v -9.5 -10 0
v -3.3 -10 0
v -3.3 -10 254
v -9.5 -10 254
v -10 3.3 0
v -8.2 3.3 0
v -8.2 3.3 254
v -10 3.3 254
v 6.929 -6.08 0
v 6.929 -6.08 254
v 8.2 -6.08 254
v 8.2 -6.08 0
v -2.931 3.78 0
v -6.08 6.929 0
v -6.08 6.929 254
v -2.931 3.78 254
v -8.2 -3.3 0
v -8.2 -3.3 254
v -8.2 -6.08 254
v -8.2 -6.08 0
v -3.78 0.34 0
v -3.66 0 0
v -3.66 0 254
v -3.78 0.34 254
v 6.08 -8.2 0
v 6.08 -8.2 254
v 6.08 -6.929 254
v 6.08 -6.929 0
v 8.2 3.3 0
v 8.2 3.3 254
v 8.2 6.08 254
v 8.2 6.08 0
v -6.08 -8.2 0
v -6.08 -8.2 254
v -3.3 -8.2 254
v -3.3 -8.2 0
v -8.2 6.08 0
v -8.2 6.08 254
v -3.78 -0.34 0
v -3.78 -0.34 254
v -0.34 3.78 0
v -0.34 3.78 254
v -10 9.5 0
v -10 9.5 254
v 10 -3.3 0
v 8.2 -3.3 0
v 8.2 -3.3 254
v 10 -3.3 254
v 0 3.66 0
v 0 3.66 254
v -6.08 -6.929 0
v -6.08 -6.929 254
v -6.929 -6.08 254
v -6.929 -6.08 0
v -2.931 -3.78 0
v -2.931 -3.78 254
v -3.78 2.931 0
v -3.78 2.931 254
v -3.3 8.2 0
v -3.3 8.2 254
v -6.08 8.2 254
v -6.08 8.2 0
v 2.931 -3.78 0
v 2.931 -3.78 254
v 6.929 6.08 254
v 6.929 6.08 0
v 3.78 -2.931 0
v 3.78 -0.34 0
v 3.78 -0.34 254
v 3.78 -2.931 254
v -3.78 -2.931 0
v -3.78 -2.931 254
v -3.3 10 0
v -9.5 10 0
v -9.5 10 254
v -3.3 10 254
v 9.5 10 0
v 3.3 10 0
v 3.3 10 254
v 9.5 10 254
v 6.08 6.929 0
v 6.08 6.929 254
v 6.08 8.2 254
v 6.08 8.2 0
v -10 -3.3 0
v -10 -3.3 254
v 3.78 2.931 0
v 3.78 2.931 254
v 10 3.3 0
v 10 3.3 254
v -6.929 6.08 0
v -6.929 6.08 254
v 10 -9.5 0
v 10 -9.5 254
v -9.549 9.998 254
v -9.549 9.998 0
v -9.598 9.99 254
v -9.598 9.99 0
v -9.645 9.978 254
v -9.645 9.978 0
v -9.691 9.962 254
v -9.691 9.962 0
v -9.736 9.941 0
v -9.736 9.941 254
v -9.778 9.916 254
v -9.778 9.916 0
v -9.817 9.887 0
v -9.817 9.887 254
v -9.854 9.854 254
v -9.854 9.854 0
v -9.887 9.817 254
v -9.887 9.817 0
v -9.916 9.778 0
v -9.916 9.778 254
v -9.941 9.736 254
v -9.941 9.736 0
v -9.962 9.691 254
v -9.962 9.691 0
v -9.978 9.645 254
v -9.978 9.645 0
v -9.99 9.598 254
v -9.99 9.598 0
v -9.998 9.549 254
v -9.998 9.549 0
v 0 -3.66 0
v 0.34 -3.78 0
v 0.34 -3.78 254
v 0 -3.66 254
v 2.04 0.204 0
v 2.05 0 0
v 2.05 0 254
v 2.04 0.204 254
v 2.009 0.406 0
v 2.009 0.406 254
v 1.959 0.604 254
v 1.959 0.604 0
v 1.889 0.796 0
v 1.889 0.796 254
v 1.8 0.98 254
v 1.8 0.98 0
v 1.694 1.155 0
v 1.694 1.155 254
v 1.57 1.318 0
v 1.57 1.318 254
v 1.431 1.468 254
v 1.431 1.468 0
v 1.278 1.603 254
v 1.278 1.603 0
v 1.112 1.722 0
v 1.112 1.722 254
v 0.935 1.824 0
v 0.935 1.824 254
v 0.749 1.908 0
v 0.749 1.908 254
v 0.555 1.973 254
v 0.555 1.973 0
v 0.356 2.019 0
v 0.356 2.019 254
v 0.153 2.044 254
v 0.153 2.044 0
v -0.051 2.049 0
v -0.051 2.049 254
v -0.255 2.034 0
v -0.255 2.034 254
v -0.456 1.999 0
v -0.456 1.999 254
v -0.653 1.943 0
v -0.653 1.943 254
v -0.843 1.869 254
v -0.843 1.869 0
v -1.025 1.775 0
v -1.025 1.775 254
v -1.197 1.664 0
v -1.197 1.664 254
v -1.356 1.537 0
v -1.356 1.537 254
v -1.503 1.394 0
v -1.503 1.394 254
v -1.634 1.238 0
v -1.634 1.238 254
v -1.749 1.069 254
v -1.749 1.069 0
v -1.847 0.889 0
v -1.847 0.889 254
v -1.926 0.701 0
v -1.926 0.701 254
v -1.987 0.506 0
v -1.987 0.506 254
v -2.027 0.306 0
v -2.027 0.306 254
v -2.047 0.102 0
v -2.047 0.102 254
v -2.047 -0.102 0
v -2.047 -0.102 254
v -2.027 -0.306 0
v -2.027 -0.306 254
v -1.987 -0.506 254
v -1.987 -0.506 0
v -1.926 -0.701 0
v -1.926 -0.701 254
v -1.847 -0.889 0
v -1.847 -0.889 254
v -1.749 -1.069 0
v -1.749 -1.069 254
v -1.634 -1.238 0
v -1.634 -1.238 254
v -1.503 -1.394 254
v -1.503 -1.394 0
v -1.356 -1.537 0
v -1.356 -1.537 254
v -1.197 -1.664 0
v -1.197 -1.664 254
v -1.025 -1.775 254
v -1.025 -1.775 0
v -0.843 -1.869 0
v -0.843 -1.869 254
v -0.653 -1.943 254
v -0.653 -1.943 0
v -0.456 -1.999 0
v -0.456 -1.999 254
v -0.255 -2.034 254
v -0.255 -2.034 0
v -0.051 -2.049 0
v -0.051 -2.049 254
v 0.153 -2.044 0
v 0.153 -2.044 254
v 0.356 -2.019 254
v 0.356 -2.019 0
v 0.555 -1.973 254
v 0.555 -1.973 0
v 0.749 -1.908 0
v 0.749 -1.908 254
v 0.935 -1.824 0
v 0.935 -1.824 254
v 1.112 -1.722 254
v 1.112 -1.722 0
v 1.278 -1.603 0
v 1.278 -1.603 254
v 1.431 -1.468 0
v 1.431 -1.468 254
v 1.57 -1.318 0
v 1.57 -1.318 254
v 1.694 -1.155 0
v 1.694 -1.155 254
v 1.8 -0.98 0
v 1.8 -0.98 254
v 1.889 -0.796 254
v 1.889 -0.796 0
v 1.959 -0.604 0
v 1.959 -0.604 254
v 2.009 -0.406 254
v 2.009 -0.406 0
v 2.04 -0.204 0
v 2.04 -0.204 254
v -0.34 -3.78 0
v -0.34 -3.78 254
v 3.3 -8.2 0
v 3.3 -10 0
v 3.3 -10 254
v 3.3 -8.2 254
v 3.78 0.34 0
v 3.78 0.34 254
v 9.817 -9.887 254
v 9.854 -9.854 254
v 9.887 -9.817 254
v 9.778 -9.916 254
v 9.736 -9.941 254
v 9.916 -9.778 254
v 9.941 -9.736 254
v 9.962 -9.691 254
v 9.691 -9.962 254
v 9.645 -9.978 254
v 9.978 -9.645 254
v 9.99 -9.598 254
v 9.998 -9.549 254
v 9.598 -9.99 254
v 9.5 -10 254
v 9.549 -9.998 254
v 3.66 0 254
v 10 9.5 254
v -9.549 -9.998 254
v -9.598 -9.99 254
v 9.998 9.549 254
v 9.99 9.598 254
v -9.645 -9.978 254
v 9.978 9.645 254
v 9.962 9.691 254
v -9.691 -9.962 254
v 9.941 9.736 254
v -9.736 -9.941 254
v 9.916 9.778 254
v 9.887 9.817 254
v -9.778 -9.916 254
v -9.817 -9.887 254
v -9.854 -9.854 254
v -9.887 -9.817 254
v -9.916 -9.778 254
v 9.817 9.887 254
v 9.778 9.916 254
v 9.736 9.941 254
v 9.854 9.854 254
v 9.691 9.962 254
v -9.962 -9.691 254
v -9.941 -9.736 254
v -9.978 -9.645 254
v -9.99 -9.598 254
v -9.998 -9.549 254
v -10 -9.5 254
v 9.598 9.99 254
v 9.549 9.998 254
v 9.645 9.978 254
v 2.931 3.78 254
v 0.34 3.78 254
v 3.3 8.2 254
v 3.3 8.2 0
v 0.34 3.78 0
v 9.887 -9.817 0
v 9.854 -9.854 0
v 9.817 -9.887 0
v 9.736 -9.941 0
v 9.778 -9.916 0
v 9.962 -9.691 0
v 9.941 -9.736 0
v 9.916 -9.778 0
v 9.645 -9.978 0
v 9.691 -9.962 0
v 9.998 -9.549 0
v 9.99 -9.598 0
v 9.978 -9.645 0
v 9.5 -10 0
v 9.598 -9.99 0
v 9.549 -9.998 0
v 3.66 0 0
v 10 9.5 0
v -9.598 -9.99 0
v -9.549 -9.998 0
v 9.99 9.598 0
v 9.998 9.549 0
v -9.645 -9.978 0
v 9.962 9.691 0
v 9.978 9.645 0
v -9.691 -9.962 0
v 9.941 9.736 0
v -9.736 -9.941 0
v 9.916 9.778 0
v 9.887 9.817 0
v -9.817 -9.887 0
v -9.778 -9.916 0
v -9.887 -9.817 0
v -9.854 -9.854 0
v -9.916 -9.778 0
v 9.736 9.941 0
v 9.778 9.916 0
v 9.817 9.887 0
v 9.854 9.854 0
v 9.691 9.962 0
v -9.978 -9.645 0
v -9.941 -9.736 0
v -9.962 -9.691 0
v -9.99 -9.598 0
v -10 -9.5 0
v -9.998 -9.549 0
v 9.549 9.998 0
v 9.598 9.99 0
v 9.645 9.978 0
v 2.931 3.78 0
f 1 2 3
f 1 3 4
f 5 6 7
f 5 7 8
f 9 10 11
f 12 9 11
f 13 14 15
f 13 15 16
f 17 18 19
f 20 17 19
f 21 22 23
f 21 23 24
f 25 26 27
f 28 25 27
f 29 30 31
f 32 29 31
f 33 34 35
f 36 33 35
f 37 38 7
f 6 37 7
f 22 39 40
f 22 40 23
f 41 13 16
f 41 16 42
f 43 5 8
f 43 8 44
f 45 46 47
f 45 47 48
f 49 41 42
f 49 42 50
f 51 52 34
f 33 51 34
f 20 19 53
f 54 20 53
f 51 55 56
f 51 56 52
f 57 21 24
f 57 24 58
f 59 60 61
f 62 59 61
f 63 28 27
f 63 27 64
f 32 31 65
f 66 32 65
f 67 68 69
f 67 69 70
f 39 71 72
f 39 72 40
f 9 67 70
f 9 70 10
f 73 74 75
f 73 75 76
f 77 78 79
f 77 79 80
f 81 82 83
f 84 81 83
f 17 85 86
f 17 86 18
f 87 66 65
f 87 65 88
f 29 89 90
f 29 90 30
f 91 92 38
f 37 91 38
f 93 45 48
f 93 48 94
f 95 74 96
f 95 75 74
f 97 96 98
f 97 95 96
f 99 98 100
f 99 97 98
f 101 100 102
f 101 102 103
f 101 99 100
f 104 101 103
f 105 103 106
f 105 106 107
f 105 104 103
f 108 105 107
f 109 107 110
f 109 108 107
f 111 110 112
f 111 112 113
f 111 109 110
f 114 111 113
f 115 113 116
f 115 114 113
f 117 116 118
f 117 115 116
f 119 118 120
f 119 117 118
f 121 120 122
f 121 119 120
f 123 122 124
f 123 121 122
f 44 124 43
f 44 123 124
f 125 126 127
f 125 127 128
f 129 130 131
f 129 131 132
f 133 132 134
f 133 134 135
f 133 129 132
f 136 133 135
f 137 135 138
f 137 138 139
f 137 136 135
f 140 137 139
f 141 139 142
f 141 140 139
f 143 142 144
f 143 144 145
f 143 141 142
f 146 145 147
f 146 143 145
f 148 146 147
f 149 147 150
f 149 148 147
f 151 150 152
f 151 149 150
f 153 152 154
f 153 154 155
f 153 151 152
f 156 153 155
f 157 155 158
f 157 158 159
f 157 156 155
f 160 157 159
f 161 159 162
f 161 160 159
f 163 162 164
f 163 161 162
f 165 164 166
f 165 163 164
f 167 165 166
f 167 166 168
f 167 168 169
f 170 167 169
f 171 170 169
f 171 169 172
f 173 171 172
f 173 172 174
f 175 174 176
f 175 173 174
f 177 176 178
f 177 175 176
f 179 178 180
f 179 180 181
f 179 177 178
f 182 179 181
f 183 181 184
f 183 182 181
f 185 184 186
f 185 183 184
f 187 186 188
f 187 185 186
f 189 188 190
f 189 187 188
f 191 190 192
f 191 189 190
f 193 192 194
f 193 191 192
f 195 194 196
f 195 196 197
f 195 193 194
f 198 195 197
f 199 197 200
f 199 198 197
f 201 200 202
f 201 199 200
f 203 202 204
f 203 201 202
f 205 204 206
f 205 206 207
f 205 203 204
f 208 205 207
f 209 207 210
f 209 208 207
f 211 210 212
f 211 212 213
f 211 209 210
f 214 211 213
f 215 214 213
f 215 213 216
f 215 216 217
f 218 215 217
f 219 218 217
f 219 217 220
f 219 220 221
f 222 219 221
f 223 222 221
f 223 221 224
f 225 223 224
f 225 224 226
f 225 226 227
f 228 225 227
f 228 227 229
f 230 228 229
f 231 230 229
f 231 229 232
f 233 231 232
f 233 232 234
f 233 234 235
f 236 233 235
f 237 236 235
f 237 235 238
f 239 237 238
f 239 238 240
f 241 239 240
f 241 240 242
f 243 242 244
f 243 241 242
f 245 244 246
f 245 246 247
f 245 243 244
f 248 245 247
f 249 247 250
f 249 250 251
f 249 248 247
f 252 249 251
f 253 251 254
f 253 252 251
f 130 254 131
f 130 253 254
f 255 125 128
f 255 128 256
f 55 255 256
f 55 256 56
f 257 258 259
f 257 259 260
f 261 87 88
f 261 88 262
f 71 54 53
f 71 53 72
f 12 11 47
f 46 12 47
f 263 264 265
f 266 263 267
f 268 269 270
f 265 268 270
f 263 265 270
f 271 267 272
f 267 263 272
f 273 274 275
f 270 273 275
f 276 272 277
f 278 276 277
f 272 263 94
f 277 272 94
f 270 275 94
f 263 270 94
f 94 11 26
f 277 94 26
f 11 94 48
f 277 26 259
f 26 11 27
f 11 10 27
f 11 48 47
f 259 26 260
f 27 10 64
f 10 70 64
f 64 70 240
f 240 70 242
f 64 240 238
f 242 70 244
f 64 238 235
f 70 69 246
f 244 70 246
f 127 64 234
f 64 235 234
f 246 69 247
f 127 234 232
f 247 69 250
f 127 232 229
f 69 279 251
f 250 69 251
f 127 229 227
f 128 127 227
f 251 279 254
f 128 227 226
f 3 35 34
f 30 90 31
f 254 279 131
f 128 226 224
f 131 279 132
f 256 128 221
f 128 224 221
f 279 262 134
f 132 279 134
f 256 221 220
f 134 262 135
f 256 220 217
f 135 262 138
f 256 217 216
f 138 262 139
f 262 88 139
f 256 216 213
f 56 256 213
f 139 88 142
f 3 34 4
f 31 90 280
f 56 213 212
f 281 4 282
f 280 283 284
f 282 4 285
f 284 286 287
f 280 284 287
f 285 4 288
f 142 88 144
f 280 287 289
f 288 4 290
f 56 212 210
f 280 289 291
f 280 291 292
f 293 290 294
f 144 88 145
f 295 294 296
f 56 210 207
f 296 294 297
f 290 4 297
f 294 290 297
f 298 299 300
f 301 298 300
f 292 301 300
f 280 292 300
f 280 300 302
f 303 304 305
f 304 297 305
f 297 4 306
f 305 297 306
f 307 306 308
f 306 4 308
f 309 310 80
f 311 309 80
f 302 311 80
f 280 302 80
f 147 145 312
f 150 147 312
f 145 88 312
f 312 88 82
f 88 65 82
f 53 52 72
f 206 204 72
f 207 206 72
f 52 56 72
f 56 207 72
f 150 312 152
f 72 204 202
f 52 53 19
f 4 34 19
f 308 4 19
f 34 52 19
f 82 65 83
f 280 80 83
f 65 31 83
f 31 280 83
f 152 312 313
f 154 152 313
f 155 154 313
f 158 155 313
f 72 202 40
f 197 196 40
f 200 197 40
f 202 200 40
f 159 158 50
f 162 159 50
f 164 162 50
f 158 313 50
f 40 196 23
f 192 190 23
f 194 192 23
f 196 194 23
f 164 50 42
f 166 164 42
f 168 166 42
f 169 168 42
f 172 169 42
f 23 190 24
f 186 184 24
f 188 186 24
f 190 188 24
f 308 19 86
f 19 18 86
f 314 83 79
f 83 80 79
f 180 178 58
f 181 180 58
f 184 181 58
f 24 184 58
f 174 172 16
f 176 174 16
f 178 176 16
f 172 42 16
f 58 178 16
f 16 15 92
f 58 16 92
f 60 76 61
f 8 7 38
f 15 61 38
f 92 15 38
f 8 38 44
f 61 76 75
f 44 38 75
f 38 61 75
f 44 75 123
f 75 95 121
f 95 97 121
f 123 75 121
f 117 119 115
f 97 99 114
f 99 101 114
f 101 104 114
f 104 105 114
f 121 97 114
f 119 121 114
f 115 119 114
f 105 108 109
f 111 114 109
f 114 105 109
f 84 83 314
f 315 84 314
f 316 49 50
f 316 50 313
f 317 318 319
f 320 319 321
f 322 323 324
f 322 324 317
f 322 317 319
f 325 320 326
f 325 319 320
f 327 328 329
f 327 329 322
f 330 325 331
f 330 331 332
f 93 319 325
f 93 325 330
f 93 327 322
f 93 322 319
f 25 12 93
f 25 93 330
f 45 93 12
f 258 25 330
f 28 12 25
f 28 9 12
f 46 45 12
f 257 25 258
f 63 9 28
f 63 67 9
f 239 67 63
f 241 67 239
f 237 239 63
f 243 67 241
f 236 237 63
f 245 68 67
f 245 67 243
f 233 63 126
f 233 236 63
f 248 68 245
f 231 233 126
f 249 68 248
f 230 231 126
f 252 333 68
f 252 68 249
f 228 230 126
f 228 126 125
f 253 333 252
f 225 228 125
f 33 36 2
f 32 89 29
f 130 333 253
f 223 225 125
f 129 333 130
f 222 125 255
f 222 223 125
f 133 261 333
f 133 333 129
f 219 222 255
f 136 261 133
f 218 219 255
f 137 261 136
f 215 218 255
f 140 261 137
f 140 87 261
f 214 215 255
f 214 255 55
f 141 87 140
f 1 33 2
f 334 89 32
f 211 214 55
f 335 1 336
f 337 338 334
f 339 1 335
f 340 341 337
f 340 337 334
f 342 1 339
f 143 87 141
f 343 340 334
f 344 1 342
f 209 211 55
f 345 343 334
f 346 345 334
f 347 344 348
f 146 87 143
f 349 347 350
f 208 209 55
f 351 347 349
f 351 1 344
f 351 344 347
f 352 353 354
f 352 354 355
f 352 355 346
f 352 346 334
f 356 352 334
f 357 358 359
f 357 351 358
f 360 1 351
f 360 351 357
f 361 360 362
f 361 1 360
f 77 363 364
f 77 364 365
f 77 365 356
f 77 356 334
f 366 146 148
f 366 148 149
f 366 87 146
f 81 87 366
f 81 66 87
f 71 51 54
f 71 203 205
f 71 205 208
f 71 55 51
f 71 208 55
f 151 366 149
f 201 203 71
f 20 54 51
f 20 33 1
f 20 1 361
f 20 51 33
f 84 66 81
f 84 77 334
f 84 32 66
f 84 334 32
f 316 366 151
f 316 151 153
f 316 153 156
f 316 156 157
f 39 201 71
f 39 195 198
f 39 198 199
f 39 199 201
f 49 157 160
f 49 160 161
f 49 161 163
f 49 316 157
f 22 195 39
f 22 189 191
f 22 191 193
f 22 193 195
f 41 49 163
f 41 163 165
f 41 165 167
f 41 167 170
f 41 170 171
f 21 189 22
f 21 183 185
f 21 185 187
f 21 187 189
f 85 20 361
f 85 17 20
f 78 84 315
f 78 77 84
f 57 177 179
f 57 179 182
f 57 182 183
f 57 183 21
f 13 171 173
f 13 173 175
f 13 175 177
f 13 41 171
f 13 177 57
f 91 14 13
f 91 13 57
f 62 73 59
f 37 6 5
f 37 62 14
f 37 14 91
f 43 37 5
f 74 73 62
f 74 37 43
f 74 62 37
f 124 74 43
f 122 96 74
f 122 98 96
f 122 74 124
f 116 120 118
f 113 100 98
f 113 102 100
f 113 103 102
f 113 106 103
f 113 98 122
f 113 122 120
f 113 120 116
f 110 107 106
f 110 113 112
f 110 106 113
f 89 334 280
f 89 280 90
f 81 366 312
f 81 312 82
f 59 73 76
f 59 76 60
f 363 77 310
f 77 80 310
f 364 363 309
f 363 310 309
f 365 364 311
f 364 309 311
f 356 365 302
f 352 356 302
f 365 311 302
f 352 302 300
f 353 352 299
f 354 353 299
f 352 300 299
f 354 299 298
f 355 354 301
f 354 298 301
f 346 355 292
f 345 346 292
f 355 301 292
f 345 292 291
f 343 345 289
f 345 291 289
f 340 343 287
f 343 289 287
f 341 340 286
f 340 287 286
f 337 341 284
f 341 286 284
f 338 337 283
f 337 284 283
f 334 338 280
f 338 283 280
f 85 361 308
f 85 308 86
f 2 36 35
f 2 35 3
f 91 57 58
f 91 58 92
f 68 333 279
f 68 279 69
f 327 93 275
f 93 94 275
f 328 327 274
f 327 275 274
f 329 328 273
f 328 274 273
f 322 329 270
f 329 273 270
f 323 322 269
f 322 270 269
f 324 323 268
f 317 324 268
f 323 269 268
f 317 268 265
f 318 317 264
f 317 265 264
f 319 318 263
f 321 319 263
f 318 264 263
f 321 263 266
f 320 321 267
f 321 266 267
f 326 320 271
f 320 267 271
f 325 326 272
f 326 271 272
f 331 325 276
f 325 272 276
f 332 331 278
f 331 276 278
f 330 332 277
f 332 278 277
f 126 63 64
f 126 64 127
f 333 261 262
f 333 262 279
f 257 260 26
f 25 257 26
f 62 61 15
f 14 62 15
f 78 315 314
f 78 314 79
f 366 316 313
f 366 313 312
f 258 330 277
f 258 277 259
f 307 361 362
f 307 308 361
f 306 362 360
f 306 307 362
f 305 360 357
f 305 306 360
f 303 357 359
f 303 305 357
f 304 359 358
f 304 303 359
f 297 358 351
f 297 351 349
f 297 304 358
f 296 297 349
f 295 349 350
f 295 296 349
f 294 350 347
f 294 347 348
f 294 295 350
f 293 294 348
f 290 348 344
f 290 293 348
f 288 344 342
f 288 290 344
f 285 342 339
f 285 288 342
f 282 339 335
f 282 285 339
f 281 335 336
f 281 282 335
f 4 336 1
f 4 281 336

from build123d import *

# Parameters (mm, degrees)
SKETCH1_R           = 2.05
BOSS_EXTRUDE1_DEPTH = 254
FILLET1_R           = 0.5


with BuildPart() as part:
    # Sketch1 → Boss-Extrude1 (new body)
    with BuildSketch(Plane.XY):
        Polygon((-3.3, 10), (-3.3, 8.2), (-6.08, 8.2), (-6.08, 6.928528137), (-2.931471863, 3.78), (-0.34, 3.78), (0, 3.66), (0.34, 3.78), (2.931471863, 3.78), (6.08, 6.928528137), (6.08, 8.2), (3.3, 8.2), (3.3, 10), (10, 10), (10, 3.3), (8.2, 3.3), (8.2, 6.08), (6.928528137, 6.08), (3.78, 2.931471863), (3.78, 0.34), (3.66, 0), (3.78, -0.34), (3.78, -2.931471863), (6.928528137, -6.08), (8.2, -6.08), (8.2, -3.3), (10, -3.3), (10, -10), (3.3, -10), (3.3, -8.2), (6.08, -8.2), (6.08, -6.928528137), (2.931471863, -3.78), (0.34, -3.78), (0, -3.66), (-0.34, -3.78), (-2.931471863, -3.78), (-6.08, -6.928528137), (-6.08, -8.2), (-3.3, -8.2), (-3.3, -10), (-10, -10), (-10, -3.3), (-8.2, -3.3), (-8.2, -6.08), (-6.928528137, -6.08), (-3.78, -2.931471863), (-3.78, -0.34), (-3.66, 0), (-3.78, 0.34), (-3.78, 2.931471863), (-6.928528137, 6.08), (-8.2, 6.08), (-8.2, 3.3), (-10, 3.3), (-10, 10), align=None)
        Circle(SKETCH1_R, mode=Mode.SUBTRACT)
    extrude(amount=BOSS_EXTRUDE1_DEPTH)

    # Fillet1
    fillet1_edges = [part.edges().sort_by_distance(p)[0] for p in [
        (10, 10, 127),
        (10, -10, 127),
        (-10, -10, 127),
        (-10, 10, 127),
    ]]
    fillet(fillet1_edges, radius=FILLET1_R)


solid = part.part
